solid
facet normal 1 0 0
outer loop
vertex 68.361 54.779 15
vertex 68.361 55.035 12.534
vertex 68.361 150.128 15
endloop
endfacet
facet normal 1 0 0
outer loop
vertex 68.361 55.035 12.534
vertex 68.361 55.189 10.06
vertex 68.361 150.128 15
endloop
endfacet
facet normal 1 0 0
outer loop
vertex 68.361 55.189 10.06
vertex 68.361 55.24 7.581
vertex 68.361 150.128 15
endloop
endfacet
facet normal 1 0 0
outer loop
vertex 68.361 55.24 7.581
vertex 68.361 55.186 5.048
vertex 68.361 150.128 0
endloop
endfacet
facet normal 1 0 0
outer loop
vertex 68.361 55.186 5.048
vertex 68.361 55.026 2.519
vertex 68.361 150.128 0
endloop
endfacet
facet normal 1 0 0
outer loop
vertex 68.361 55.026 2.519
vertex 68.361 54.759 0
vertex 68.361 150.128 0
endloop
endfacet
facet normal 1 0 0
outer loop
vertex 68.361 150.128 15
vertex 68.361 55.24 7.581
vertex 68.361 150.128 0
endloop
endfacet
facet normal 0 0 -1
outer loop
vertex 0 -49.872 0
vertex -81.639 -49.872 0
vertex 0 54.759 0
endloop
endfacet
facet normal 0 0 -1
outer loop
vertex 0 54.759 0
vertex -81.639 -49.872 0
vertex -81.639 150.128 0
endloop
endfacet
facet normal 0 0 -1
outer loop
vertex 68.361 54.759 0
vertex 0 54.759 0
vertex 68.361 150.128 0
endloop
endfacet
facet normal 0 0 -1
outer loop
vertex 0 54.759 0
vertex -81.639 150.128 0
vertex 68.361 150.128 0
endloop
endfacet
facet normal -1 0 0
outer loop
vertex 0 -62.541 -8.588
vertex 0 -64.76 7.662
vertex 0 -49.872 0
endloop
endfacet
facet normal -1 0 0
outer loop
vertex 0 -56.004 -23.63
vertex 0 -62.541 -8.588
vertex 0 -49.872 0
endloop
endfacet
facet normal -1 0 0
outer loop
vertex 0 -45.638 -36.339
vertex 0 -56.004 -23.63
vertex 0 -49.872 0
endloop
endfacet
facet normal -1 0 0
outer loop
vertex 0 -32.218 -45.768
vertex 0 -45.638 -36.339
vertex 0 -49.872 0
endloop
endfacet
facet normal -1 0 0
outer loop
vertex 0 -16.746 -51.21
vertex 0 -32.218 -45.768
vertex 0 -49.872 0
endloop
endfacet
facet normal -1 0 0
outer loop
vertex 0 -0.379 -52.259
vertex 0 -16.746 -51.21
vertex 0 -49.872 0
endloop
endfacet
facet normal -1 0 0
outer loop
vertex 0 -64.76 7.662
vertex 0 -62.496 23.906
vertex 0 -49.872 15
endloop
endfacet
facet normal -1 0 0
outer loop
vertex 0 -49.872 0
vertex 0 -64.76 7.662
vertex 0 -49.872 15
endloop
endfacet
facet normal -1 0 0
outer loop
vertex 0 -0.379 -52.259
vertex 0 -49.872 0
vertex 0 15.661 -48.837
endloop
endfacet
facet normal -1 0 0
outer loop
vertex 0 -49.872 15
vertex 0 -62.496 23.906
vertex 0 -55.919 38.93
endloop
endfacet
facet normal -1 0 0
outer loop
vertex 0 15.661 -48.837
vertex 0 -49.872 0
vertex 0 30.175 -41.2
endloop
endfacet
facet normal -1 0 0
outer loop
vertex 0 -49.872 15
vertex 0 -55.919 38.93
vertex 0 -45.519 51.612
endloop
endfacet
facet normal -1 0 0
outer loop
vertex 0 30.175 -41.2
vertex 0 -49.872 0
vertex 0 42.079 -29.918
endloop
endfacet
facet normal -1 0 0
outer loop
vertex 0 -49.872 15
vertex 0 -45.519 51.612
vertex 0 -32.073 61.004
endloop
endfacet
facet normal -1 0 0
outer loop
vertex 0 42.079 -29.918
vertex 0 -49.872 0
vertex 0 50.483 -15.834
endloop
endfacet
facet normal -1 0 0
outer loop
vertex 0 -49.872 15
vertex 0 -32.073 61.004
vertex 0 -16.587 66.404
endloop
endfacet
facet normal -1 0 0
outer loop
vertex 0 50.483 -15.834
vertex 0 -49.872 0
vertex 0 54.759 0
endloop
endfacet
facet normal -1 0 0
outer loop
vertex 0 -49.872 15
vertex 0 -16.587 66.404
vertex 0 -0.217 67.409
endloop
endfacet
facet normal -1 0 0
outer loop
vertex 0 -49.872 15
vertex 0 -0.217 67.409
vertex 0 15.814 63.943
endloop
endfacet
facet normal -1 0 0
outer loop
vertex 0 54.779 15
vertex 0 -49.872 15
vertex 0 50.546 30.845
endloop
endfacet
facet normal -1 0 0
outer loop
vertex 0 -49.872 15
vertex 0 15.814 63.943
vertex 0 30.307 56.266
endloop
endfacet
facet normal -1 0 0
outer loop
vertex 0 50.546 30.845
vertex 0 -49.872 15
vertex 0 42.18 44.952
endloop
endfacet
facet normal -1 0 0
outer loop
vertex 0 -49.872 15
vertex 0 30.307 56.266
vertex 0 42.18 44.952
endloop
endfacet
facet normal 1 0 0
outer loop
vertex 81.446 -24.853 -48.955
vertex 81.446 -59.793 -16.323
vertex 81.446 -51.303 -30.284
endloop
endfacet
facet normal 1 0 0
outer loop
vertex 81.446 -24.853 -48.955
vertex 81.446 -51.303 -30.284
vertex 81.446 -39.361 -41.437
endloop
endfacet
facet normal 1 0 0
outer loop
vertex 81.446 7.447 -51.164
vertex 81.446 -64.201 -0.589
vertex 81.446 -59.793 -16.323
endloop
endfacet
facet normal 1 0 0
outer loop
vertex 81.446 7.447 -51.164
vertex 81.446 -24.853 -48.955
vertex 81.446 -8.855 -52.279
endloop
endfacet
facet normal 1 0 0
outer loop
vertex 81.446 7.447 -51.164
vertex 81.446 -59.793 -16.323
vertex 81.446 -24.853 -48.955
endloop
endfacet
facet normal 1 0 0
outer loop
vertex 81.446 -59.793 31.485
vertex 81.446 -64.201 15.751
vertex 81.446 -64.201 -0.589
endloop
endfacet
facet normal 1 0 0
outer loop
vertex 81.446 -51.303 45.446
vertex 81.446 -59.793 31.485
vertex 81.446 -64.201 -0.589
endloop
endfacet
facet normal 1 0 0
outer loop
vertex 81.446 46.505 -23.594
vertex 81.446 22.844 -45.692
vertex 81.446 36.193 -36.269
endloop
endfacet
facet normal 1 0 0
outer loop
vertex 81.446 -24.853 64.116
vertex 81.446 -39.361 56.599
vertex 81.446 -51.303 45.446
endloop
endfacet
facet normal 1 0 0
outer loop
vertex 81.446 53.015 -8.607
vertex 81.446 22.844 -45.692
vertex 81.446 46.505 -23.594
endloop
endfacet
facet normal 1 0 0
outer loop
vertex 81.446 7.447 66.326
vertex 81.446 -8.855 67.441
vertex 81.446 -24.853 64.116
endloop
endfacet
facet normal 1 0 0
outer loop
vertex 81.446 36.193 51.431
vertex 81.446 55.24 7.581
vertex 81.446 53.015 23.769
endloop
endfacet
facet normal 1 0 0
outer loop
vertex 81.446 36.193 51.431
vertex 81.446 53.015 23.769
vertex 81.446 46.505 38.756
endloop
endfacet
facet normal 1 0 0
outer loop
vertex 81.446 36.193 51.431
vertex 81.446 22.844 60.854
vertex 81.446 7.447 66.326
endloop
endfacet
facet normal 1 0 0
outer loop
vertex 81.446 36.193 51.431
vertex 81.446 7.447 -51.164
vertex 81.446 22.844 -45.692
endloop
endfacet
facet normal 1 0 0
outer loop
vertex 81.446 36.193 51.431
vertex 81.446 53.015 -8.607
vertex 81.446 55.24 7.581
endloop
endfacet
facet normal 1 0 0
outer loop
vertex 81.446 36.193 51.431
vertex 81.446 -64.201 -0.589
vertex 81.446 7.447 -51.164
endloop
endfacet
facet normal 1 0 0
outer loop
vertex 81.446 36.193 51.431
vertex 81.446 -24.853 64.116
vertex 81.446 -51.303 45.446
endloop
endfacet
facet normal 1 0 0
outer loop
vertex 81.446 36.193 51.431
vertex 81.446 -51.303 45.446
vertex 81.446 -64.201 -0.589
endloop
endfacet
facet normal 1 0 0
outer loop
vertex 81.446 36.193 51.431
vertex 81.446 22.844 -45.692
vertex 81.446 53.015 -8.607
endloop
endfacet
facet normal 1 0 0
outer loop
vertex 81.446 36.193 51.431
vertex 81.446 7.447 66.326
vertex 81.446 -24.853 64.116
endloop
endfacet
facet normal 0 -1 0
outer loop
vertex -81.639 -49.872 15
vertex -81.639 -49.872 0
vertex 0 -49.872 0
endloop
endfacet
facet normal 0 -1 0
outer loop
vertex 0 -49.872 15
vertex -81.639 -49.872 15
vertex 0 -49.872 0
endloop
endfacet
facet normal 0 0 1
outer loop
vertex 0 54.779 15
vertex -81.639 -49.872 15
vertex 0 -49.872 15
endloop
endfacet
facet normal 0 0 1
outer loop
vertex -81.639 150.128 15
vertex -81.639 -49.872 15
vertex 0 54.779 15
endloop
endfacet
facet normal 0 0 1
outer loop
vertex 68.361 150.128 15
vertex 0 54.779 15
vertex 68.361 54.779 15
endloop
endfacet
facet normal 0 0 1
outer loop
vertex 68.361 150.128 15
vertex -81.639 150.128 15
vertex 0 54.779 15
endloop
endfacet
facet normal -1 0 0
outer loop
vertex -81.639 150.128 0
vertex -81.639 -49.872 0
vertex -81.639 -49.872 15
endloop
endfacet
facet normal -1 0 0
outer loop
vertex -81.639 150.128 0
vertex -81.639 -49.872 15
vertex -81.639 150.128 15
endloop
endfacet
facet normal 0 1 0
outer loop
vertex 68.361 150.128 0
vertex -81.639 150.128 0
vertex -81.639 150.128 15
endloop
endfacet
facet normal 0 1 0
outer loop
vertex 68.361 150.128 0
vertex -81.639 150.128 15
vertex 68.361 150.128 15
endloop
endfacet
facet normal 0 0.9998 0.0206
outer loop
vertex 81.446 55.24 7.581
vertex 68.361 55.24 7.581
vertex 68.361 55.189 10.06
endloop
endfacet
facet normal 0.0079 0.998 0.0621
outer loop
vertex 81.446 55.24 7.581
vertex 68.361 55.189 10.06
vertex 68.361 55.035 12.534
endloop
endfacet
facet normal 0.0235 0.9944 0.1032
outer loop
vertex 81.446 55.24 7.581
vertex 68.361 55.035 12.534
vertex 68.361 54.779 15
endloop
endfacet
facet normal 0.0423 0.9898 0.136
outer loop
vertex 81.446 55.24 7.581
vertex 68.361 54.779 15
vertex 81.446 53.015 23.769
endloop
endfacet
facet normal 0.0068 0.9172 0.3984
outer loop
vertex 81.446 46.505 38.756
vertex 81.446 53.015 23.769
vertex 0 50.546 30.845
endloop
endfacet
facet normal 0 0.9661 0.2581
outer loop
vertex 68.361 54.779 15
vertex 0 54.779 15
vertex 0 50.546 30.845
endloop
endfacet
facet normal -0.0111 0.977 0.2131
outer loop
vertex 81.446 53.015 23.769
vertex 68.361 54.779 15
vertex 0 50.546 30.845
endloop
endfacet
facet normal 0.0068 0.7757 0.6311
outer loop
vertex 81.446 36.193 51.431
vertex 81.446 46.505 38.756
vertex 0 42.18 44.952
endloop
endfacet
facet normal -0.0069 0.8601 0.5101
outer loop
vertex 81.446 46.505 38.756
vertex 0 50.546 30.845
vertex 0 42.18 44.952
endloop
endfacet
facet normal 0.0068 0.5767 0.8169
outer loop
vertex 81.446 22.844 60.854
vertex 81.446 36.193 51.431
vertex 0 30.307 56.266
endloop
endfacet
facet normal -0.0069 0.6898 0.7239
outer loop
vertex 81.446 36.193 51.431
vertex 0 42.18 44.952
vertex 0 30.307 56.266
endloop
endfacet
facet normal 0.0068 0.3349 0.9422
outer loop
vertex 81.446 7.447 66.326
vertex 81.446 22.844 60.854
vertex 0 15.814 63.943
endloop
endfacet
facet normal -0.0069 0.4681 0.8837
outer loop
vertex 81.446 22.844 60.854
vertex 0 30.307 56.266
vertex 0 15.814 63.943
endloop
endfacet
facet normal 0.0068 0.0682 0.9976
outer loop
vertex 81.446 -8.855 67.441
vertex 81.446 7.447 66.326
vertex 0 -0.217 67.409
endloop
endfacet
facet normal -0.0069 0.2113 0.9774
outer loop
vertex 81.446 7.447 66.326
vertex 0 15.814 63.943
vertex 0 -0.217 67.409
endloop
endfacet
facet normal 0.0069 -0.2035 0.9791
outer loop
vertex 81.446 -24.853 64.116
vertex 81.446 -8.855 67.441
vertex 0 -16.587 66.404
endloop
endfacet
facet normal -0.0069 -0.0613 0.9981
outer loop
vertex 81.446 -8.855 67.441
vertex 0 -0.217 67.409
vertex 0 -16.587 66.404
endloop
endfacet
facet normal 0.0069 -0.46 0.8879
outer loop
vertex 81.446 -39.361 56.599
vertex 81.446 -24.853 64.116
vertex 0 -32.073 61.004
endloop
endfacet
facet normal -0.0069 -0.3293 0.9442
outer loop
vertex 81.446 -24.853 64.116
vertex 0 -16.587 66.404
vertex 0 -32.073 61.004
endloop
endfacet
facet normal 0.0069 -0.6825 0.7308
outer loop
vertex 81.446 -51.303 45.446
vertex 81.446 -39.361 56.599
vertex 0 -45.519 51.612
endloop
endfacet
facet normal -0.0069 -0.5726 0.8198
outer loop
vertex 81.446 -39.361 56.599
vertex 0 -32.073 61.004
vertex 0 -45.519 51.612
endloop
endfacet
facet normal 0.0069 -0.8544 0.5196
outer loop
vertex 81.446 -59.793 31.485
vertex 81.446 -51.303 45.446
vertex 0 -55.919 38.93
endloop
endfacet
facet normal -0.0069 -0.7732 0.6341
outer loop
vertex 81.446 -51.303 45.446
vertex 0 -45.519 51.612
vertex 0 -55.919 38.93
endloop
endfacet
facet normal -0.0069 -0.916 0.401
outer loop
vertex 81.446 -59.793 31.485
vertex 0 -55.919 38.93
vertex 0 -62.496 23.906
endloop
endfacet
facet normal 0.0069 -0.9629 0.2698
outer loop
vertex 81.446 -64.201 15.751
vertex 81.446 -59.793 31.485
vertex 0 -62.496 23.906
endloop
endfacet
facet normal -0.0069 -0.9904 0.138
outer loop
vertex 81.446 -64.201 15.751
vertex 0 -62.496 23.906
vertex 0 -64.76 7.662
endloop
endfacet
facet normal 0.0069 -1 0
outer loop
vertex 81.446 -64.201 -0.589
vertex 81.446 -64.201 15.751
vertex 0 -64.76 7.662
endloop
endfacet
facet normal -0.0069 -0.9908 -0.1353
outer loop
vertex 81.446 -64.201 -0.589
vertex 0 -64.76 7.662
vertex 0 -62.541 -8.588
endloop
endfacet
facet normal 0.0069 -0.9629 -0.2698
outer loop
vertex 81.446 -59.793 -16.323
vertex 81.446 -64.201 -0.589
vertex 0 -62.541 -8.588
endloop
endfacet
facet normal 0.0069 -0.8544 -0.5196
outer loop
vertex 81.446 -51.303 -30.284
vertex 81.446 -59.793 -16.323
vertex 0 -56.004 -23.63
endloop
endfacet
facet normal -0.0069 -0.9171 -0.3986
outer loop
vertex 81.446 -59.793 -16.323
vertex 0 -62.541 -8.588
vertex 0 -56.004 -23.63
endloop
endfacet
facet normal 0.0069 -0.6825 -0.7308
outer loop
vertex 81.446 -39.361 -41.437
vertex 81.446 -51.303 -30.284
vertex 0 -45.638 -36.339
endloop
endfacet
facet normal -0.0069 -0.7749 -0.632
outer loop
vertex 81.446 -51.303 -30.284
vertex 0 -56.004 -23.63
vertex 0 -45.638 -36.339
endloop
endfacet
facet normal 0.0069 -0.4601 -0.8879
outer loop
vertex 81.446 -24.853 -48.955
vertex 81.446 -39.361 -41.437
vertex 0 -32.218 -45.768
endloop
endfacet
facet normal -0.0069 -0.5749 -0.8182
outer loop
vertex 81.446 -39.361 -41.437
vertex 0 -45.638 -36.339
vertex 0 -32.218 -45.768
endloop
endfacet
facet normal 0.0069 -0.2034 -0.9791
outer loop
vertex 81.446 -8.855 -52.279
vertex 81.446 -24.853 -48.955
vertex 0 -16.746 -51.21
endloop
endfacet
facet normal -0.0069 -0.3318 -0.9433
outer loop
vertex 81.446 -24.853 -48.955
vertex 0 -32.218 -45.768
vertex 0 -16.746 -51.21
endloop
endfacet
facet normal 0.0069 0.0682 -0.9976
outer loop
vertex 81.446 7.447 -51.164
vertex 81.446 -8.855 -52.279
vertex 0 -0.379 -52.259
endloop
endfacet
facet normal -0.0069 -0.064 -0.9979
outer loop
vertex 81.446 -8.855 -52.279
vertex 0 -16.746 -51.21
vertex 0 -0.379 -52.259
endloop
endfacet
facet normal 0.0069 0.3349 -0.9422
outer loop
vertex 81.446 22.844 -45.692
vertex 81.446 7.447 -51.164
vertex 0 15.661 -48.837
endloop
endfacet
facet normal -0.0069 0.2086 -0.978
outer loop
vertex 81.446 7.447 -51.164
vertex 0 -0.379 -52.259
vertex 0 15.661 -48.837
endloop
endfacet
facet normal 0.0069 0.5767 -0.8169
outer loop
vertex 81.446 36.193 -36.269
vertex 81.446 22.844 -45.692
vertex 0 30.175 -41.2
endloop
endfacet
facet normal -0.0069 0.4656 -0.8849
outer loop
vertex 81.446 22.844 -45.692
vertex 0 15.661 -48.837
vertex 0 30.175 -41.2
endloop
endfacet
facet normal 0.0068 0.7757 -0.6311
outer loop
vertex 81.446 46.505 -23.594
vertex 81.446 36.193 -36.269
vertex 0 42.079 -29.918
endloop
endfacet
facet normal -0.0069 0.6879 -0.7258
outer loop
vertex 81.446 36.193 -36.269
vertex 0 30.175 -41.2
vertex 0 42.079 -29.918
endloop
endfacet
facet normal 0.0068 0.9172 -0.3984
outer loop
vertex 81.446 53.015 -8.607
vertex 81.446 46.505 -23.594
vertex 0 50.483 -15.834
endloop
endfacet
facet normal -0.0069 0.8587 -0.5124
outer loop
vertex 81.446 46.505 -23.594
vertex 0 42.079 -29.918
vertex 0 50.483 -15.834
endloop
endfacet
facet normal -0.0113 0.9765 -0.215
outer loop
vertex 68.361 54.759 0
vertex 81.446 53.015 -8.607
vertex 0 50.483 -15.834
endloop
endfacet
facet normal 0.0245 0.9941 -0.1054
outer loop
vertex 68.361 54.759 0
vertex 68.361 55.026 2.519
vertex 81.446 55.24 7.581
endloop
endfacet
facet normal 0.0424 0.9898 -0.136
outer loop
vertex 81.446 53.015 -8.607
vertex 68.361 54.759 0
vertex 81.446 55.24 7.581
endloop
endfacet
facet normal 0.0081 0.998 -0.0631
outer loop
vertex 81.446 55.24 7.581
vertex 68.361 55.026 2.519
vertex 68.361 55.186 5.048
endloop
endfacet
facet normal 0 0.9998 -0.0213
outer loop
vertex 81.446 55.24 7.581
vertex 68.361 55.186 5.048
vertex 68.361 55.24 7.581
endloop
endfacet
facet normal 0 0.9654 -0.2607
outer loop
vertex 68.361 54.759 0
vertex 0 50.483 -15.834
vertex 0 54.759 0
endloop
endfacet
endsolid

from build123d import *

# Parameters (mm, degrees)
F0_W     = 150
F0_H     = 200
F1_DEPTH = 15
F2_R     = 60
F3_DEPTH = 81.44554


with BuildPart() as f1:
    # F0 (on Top) → F1 (new body)
    with BuildSketch(Plane.XY):
        with Locations((-6.63894, 50.128499)):
            Rectangle(F0_W, F0_H)
    extrude(amount=F1_DEPTH)

    # F2 (on Right) → F3 (join)
    with BuildSketch(Plane.YZ):
        with Locations((-4.760173, 7.580816)):
            Circle(F2_R)
    extrude(amount=F3_DEPTH)


solid = f1.part
